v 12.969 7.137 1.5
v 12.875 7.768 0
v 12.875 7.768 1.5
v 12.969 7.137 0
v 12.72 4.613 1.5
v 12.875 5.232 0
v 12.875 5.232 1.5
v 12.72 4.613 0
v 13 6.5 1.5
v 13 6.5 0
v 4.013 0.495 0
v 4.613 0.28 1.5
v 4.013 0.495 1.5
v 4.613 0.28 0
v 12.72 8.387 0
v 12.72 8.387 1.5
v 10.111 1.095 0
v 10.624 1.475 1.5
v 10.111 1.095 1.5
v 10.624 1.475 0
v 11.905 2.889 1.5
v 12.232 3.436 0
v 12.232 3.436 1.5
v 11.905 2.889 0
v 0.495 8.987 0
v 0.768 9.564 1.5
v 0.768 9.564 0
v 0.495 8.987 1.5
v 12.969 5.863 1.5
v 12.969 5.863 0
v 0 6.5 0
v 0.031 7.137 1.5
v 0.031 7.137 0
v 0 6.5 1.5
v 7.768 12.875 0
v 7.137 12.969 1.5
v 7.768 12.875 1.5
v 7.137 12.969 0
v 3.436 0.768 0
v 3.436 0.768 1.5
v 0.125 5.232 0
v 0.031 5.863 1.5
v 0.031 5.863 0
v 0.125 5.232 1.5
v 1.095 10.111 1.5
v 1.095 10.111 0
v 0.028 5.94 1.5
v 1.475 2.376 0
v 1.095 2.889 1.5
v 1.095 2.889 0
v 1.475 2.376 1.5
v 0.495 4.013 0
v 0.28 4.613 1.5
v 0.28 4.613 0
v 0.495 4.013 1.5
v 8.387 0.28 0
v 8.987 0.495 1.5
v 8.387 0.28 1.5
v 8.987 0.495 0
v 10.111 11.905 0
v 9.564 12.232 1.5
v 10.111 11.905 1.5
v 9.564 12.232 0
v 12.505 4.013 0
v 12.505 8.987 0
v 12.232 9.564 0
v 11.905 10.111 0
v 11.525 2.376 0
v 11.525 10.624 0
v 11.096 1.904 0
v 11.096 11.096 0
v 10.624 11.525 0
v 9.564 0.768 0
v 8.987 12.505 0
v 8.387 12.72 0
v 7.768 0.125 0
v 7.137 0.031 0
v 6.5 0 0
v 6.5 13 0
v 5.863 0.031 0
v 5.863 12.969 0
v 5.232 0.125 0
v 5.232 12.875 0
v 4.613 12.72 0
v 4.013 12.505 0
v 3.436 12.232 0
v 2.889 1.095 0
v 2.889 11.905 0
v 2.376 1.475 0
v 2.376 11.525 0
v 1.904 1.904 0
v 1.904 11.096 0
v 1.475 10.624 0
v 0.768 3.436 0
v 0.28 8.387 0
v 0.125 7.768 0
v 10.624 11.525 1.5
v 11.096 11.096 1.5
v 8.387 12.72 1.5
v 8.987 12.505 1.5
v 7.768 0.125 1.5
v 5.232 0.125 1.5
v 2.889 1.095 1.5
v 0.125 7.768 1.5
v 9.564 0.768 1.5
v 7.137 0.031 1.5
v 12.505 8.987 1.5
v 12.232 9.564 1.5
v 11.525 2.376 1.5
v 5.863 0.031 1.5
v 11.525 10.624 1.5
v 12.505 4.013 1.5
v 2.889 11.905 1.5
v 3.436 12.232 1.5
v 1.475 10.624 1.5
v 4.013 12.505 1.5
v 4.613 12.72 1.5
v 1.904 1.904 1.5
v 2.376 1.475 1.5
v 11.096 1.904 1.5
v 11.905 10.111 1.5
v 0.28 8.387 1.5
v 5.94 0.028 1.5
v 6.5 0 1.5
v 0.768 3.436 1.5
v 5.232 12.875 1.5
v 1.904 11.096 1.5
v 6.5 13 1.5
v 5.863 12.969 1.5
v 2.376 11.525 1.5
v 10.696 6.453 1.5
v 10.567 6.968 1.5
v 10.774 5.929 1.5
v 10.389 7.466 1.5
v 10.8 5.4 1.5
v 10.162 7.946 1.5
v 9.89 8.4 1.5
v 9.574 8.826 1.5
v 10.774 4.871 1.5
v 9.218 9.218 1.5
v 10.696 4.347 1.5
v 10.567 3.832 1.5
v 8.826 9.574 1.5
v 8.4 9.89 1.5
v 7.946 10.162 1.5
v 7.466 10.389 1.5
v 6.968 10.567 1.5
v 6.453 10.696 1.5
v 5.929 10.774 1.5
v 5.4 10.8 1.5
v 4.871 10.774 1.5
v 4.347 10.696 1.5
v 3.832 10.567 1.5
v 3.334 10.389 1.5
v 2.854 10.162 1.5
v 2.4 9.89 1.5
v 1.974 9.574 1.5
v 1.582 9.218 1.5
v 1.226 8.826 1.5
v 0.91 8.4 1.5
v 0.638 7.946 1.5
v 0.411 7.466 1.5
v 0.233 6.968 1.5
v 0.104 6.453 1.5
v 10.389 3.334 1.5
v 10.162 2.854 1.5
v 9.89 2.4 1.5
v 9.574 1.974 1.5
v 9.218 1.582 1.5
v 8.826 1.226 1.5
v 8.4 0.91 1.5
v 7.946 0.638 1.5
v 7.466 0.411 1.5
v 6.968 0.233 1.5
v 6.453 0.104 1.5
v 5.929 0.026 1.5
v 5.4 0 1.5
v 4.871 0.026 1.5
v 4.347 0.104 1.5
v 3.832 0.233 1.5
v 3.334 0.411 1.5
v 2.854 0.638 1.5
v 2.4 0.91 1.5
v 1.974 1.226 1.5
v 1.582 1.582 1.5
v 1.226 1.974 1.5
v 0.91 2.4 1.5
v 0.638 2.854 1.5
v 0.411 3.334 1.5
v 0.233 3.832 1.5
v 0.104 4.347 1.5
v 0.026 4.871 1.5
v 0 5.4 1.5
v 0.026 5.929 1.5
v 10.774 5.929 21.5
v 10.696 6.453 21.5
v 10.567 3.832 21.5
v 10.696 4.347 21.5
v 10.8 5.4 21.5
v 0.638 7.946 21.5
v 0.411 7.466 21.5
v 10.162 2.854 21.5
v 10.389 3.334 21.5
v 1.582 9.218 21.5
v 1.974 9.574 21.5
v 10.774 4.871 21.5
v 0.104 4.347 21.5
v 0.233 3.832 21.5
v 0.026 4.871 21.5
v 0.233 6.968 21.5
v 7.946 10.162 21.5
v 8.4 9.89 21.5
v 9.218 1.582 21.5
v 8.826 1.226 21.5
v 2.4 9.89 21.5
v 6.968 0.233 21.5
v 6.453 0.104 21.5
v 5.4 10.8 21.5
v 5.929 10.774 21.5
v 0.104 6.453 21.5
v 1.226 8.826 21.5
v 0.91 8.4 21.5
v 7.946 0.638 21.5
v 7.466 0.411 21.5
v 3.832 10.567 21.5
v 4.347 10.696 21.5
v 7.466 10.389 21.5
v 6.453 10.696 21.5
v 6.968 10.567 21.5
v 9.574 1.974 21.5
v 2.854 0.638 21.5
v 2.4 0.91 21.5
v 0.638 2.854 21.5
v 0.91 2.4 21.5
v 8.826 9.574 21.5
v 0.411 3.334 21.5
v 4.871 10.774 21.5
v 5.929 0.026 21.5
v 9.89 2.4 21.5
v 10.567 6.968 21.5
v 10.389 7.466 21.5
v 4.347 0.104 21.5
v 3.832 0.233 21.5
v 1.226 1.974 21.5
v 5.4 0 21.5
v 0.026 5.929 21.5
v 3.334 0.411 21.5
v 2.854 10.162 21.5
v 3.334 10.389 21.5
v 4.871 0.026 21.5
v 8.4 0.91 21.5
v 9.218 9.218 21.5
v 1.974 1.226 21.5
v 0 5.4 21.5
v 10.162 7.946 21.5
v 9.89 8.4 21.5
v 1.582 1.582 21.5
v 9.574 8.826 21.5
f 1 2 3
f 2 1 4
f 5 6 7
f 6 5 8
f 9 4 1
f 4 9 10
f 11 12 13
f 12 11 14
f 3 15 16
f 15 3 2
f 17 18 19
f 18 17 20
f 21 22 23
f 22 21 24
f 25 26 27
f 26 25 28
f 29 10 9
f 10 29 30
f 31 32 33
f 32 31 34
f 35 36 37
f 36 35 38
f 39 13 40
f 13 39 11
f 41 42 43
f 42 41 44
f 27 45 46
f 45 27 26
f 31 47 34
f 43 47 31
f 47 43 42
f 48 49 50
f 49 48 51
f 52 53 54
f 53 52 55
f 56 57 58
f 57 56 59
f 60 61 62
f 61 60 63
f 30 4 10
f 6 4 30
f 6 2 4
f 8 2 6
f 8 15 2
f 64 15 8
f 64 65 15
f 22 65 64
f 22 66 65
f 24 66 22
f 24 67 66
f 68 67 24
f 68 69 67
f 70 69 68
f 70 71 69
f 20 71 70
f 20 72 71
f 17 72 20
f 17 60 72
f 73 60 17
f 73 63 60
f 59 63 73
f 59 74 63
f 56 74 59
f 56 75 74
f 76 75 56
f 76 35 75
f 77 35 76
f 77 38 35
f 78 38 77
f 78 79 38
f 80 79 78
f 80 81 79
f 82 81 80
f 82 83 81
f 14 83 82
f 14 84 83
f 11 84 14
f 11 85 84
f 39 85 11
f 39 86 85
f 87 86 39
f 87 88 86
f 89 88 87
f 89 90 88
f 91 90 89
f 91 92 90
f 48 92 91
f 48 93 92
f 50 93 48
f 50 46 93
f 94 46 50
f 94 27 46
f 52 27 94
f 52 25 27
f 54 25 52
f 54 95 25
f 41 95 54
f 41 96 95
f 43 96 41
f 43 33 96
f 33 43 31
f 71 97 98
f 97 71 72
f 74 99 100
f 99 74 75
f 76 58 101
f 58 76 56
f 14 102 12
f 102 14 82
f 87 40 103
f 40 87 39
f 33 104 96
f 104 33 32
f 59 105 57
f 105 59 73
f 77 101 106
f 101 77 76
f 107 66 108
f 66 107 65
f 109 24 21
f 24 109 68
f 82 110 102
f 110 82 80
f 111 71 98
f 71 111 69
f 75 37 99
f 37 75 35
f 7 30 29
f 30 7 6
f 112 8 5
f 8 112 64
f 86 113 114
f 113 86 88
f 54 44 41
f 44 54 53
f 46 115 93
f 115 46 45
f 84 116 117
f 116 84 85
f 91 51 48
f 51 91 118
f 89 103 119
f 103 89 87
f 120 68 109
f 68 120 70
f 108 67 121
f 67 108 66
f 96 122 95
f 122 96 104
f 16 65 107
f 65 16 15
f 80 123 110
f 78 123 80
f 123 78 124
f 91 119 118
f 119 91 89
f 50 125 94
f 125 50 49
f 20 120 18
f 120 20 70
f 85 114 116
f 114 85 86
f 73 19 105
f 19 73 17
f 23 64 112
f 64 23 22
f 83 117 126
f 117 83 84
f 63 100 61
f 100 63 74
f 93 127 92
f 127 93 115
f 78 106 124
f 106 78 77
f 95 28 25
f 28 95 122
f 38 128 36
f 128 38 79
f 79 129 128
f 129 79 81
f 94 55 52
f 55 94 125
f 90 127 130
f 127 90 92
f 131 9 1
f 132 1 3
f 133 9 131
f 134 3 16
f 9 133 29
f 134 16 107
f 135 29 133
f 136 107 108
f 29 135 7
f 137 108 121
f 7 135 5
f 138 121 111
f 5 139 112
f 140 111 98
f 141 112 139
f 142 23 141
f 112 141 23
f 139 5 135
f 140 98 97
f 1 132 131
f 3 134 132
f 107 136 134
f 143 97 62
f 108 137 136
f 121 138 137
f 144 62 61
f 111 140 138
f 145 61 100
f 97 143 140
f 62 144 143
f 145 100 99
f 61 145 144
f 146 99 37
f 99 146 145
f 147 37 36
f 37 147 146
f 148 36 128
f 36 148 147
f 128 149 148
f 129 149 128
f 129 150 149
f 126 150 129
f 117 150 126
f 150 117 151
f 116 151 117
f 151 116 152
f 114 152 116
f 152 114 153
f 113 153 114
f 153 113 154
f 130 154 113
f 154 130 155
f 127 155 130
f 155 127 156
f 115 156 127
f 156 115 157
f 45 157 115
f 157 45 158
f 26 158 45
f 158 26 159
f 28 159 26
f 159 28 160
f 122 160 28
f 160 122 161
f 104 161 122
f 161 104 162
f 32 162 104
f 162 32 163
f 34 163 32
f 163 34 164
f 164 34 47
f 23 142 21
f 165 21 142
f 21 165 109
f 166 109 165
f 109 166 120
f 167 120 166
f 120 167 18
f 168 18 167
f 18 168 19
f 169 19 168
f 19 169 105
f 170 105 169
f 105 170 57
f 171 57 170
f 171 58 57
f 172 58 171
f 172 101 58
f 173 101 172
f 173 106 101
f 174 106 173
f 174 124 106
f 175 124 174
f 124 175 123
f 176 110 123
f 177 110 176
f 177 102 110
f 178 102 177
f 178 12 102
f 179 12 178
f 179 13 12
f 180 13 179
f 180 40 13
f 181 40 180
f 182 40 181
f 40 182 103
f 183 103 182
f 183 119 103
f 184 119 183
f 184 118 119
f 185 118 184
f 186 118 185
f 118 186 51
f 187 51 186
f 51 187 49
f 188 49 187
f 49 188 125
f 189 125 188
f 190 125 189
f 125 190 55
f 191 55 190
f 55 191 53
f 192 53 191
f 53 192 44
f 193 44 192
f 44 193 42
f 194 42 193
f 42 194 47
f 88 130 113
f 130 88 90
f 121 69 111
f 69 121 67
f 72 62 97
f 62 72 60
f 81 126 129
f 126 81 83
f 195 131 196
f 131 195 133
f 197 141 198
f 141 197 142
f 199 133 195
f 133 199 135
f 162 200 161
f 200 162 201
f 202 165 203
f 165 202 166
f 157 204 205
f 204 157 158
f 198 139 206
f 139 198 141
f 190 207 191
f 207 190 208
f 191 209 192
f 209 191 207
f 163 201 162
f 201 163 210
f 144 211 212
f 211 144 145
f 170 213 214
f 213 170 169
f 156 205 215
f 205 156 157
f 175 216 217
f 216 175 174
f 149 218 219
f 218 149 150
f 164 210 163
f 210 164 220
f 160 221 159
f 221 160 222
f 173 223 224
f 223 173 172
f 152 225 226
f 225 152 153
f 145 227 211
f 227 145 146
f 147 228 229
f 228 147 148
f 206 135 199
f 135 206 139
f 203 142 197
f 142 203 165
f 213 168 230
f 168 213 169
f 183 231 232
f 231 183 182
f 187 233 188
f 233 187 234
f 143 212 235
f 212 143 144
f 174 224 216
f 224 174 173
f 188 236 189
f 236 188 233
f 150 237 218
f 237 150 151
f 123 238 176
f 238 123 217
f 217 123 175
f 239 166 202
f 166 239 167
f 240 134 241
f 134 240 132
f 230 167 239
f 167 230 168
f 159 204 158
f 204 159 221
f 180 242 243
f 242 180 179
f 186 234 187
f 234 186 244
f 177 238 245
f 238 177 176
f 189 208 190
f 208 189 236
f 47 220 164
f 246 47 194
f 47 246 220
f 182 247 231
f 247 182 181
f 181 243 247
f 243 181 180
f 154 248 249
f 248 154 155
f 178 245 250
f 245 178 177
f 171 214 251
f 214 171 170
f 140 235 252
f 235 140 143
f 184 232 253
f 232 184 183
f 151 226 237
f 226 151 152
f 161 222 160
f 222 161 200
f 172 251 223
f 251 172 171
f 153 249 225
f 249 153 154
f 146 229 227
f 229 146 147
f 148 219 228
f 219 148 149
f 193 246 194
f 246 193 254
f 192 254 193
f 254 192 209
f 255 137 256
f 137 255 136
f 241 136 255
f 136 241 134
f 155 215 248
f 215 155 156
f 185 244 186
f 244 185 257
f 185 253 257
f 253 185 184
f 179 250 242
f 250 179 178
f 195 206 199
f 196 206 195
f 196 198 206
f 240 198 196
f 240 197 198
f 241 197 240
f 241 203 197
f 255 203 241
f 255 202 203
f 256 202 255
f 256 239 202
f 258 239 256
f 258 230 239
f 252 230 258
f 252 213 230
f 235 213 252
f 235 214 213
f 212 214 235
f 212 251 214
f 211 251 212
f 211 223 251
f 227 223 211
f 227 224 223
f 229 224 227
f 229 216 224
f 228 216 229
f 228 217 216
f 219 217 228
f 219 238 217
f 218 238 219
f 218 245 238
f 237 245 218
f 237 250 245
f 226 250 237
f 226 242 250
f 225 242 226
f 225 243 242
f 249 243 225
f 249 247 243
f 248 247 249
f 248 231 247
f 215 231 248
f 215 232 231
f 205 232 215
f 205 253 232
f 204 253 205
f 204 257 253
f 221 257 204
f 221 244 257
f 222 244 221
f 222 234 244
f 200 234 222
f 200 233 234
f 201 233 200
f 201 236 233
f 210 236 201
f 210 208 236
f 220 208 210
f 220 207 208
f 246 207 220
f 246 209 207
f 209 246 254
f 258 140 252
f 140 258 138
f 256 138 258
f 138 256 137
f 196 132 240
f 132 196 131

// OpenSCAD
// Define dimensions
$fn = 64; // Number of facets for smooth surfaces

// Collar dimensions
collar_diameter = 13;
collar_thickness = 1.5;

// Sleeve body dimensions
sleeve_outer_diameter = 10.8;
sleeve_height = 21.5 - collar_thickness;

// Bore dimensions
bore_diameter = 6.2;
bore_length = sleeve_height;

// Main function to build the adapter sleeve
module adapter_sleeve() {
    // Collar
    translate([collar_diameter / 2, collar_diameter / 2, 0]) {
        linear_extrude(height=collar_thickness) {
            circle(d=collar_diameter);
        }
    }

    // Sleeve body
    translate([sleeve_outer_diameter / 2, sleeve_outer_diameter / 2, collar_thickness]) {
        linear_extrude(height=sleeve_height) {
            circle(d=sleeve_outer_diameter);
        }
    }

    // Bore
    translate([sleeve_outer_diameter / 2, sleeve_outer_diameter / 2, collar_thickness + bore_length / 2]) {
        rotate_extrude(angle=360) {
            cylinder(h=bore_length, r=bore_diameter / 2);
        }
    }
}

// Render the adapter sleeve
adapter_sleeve();
